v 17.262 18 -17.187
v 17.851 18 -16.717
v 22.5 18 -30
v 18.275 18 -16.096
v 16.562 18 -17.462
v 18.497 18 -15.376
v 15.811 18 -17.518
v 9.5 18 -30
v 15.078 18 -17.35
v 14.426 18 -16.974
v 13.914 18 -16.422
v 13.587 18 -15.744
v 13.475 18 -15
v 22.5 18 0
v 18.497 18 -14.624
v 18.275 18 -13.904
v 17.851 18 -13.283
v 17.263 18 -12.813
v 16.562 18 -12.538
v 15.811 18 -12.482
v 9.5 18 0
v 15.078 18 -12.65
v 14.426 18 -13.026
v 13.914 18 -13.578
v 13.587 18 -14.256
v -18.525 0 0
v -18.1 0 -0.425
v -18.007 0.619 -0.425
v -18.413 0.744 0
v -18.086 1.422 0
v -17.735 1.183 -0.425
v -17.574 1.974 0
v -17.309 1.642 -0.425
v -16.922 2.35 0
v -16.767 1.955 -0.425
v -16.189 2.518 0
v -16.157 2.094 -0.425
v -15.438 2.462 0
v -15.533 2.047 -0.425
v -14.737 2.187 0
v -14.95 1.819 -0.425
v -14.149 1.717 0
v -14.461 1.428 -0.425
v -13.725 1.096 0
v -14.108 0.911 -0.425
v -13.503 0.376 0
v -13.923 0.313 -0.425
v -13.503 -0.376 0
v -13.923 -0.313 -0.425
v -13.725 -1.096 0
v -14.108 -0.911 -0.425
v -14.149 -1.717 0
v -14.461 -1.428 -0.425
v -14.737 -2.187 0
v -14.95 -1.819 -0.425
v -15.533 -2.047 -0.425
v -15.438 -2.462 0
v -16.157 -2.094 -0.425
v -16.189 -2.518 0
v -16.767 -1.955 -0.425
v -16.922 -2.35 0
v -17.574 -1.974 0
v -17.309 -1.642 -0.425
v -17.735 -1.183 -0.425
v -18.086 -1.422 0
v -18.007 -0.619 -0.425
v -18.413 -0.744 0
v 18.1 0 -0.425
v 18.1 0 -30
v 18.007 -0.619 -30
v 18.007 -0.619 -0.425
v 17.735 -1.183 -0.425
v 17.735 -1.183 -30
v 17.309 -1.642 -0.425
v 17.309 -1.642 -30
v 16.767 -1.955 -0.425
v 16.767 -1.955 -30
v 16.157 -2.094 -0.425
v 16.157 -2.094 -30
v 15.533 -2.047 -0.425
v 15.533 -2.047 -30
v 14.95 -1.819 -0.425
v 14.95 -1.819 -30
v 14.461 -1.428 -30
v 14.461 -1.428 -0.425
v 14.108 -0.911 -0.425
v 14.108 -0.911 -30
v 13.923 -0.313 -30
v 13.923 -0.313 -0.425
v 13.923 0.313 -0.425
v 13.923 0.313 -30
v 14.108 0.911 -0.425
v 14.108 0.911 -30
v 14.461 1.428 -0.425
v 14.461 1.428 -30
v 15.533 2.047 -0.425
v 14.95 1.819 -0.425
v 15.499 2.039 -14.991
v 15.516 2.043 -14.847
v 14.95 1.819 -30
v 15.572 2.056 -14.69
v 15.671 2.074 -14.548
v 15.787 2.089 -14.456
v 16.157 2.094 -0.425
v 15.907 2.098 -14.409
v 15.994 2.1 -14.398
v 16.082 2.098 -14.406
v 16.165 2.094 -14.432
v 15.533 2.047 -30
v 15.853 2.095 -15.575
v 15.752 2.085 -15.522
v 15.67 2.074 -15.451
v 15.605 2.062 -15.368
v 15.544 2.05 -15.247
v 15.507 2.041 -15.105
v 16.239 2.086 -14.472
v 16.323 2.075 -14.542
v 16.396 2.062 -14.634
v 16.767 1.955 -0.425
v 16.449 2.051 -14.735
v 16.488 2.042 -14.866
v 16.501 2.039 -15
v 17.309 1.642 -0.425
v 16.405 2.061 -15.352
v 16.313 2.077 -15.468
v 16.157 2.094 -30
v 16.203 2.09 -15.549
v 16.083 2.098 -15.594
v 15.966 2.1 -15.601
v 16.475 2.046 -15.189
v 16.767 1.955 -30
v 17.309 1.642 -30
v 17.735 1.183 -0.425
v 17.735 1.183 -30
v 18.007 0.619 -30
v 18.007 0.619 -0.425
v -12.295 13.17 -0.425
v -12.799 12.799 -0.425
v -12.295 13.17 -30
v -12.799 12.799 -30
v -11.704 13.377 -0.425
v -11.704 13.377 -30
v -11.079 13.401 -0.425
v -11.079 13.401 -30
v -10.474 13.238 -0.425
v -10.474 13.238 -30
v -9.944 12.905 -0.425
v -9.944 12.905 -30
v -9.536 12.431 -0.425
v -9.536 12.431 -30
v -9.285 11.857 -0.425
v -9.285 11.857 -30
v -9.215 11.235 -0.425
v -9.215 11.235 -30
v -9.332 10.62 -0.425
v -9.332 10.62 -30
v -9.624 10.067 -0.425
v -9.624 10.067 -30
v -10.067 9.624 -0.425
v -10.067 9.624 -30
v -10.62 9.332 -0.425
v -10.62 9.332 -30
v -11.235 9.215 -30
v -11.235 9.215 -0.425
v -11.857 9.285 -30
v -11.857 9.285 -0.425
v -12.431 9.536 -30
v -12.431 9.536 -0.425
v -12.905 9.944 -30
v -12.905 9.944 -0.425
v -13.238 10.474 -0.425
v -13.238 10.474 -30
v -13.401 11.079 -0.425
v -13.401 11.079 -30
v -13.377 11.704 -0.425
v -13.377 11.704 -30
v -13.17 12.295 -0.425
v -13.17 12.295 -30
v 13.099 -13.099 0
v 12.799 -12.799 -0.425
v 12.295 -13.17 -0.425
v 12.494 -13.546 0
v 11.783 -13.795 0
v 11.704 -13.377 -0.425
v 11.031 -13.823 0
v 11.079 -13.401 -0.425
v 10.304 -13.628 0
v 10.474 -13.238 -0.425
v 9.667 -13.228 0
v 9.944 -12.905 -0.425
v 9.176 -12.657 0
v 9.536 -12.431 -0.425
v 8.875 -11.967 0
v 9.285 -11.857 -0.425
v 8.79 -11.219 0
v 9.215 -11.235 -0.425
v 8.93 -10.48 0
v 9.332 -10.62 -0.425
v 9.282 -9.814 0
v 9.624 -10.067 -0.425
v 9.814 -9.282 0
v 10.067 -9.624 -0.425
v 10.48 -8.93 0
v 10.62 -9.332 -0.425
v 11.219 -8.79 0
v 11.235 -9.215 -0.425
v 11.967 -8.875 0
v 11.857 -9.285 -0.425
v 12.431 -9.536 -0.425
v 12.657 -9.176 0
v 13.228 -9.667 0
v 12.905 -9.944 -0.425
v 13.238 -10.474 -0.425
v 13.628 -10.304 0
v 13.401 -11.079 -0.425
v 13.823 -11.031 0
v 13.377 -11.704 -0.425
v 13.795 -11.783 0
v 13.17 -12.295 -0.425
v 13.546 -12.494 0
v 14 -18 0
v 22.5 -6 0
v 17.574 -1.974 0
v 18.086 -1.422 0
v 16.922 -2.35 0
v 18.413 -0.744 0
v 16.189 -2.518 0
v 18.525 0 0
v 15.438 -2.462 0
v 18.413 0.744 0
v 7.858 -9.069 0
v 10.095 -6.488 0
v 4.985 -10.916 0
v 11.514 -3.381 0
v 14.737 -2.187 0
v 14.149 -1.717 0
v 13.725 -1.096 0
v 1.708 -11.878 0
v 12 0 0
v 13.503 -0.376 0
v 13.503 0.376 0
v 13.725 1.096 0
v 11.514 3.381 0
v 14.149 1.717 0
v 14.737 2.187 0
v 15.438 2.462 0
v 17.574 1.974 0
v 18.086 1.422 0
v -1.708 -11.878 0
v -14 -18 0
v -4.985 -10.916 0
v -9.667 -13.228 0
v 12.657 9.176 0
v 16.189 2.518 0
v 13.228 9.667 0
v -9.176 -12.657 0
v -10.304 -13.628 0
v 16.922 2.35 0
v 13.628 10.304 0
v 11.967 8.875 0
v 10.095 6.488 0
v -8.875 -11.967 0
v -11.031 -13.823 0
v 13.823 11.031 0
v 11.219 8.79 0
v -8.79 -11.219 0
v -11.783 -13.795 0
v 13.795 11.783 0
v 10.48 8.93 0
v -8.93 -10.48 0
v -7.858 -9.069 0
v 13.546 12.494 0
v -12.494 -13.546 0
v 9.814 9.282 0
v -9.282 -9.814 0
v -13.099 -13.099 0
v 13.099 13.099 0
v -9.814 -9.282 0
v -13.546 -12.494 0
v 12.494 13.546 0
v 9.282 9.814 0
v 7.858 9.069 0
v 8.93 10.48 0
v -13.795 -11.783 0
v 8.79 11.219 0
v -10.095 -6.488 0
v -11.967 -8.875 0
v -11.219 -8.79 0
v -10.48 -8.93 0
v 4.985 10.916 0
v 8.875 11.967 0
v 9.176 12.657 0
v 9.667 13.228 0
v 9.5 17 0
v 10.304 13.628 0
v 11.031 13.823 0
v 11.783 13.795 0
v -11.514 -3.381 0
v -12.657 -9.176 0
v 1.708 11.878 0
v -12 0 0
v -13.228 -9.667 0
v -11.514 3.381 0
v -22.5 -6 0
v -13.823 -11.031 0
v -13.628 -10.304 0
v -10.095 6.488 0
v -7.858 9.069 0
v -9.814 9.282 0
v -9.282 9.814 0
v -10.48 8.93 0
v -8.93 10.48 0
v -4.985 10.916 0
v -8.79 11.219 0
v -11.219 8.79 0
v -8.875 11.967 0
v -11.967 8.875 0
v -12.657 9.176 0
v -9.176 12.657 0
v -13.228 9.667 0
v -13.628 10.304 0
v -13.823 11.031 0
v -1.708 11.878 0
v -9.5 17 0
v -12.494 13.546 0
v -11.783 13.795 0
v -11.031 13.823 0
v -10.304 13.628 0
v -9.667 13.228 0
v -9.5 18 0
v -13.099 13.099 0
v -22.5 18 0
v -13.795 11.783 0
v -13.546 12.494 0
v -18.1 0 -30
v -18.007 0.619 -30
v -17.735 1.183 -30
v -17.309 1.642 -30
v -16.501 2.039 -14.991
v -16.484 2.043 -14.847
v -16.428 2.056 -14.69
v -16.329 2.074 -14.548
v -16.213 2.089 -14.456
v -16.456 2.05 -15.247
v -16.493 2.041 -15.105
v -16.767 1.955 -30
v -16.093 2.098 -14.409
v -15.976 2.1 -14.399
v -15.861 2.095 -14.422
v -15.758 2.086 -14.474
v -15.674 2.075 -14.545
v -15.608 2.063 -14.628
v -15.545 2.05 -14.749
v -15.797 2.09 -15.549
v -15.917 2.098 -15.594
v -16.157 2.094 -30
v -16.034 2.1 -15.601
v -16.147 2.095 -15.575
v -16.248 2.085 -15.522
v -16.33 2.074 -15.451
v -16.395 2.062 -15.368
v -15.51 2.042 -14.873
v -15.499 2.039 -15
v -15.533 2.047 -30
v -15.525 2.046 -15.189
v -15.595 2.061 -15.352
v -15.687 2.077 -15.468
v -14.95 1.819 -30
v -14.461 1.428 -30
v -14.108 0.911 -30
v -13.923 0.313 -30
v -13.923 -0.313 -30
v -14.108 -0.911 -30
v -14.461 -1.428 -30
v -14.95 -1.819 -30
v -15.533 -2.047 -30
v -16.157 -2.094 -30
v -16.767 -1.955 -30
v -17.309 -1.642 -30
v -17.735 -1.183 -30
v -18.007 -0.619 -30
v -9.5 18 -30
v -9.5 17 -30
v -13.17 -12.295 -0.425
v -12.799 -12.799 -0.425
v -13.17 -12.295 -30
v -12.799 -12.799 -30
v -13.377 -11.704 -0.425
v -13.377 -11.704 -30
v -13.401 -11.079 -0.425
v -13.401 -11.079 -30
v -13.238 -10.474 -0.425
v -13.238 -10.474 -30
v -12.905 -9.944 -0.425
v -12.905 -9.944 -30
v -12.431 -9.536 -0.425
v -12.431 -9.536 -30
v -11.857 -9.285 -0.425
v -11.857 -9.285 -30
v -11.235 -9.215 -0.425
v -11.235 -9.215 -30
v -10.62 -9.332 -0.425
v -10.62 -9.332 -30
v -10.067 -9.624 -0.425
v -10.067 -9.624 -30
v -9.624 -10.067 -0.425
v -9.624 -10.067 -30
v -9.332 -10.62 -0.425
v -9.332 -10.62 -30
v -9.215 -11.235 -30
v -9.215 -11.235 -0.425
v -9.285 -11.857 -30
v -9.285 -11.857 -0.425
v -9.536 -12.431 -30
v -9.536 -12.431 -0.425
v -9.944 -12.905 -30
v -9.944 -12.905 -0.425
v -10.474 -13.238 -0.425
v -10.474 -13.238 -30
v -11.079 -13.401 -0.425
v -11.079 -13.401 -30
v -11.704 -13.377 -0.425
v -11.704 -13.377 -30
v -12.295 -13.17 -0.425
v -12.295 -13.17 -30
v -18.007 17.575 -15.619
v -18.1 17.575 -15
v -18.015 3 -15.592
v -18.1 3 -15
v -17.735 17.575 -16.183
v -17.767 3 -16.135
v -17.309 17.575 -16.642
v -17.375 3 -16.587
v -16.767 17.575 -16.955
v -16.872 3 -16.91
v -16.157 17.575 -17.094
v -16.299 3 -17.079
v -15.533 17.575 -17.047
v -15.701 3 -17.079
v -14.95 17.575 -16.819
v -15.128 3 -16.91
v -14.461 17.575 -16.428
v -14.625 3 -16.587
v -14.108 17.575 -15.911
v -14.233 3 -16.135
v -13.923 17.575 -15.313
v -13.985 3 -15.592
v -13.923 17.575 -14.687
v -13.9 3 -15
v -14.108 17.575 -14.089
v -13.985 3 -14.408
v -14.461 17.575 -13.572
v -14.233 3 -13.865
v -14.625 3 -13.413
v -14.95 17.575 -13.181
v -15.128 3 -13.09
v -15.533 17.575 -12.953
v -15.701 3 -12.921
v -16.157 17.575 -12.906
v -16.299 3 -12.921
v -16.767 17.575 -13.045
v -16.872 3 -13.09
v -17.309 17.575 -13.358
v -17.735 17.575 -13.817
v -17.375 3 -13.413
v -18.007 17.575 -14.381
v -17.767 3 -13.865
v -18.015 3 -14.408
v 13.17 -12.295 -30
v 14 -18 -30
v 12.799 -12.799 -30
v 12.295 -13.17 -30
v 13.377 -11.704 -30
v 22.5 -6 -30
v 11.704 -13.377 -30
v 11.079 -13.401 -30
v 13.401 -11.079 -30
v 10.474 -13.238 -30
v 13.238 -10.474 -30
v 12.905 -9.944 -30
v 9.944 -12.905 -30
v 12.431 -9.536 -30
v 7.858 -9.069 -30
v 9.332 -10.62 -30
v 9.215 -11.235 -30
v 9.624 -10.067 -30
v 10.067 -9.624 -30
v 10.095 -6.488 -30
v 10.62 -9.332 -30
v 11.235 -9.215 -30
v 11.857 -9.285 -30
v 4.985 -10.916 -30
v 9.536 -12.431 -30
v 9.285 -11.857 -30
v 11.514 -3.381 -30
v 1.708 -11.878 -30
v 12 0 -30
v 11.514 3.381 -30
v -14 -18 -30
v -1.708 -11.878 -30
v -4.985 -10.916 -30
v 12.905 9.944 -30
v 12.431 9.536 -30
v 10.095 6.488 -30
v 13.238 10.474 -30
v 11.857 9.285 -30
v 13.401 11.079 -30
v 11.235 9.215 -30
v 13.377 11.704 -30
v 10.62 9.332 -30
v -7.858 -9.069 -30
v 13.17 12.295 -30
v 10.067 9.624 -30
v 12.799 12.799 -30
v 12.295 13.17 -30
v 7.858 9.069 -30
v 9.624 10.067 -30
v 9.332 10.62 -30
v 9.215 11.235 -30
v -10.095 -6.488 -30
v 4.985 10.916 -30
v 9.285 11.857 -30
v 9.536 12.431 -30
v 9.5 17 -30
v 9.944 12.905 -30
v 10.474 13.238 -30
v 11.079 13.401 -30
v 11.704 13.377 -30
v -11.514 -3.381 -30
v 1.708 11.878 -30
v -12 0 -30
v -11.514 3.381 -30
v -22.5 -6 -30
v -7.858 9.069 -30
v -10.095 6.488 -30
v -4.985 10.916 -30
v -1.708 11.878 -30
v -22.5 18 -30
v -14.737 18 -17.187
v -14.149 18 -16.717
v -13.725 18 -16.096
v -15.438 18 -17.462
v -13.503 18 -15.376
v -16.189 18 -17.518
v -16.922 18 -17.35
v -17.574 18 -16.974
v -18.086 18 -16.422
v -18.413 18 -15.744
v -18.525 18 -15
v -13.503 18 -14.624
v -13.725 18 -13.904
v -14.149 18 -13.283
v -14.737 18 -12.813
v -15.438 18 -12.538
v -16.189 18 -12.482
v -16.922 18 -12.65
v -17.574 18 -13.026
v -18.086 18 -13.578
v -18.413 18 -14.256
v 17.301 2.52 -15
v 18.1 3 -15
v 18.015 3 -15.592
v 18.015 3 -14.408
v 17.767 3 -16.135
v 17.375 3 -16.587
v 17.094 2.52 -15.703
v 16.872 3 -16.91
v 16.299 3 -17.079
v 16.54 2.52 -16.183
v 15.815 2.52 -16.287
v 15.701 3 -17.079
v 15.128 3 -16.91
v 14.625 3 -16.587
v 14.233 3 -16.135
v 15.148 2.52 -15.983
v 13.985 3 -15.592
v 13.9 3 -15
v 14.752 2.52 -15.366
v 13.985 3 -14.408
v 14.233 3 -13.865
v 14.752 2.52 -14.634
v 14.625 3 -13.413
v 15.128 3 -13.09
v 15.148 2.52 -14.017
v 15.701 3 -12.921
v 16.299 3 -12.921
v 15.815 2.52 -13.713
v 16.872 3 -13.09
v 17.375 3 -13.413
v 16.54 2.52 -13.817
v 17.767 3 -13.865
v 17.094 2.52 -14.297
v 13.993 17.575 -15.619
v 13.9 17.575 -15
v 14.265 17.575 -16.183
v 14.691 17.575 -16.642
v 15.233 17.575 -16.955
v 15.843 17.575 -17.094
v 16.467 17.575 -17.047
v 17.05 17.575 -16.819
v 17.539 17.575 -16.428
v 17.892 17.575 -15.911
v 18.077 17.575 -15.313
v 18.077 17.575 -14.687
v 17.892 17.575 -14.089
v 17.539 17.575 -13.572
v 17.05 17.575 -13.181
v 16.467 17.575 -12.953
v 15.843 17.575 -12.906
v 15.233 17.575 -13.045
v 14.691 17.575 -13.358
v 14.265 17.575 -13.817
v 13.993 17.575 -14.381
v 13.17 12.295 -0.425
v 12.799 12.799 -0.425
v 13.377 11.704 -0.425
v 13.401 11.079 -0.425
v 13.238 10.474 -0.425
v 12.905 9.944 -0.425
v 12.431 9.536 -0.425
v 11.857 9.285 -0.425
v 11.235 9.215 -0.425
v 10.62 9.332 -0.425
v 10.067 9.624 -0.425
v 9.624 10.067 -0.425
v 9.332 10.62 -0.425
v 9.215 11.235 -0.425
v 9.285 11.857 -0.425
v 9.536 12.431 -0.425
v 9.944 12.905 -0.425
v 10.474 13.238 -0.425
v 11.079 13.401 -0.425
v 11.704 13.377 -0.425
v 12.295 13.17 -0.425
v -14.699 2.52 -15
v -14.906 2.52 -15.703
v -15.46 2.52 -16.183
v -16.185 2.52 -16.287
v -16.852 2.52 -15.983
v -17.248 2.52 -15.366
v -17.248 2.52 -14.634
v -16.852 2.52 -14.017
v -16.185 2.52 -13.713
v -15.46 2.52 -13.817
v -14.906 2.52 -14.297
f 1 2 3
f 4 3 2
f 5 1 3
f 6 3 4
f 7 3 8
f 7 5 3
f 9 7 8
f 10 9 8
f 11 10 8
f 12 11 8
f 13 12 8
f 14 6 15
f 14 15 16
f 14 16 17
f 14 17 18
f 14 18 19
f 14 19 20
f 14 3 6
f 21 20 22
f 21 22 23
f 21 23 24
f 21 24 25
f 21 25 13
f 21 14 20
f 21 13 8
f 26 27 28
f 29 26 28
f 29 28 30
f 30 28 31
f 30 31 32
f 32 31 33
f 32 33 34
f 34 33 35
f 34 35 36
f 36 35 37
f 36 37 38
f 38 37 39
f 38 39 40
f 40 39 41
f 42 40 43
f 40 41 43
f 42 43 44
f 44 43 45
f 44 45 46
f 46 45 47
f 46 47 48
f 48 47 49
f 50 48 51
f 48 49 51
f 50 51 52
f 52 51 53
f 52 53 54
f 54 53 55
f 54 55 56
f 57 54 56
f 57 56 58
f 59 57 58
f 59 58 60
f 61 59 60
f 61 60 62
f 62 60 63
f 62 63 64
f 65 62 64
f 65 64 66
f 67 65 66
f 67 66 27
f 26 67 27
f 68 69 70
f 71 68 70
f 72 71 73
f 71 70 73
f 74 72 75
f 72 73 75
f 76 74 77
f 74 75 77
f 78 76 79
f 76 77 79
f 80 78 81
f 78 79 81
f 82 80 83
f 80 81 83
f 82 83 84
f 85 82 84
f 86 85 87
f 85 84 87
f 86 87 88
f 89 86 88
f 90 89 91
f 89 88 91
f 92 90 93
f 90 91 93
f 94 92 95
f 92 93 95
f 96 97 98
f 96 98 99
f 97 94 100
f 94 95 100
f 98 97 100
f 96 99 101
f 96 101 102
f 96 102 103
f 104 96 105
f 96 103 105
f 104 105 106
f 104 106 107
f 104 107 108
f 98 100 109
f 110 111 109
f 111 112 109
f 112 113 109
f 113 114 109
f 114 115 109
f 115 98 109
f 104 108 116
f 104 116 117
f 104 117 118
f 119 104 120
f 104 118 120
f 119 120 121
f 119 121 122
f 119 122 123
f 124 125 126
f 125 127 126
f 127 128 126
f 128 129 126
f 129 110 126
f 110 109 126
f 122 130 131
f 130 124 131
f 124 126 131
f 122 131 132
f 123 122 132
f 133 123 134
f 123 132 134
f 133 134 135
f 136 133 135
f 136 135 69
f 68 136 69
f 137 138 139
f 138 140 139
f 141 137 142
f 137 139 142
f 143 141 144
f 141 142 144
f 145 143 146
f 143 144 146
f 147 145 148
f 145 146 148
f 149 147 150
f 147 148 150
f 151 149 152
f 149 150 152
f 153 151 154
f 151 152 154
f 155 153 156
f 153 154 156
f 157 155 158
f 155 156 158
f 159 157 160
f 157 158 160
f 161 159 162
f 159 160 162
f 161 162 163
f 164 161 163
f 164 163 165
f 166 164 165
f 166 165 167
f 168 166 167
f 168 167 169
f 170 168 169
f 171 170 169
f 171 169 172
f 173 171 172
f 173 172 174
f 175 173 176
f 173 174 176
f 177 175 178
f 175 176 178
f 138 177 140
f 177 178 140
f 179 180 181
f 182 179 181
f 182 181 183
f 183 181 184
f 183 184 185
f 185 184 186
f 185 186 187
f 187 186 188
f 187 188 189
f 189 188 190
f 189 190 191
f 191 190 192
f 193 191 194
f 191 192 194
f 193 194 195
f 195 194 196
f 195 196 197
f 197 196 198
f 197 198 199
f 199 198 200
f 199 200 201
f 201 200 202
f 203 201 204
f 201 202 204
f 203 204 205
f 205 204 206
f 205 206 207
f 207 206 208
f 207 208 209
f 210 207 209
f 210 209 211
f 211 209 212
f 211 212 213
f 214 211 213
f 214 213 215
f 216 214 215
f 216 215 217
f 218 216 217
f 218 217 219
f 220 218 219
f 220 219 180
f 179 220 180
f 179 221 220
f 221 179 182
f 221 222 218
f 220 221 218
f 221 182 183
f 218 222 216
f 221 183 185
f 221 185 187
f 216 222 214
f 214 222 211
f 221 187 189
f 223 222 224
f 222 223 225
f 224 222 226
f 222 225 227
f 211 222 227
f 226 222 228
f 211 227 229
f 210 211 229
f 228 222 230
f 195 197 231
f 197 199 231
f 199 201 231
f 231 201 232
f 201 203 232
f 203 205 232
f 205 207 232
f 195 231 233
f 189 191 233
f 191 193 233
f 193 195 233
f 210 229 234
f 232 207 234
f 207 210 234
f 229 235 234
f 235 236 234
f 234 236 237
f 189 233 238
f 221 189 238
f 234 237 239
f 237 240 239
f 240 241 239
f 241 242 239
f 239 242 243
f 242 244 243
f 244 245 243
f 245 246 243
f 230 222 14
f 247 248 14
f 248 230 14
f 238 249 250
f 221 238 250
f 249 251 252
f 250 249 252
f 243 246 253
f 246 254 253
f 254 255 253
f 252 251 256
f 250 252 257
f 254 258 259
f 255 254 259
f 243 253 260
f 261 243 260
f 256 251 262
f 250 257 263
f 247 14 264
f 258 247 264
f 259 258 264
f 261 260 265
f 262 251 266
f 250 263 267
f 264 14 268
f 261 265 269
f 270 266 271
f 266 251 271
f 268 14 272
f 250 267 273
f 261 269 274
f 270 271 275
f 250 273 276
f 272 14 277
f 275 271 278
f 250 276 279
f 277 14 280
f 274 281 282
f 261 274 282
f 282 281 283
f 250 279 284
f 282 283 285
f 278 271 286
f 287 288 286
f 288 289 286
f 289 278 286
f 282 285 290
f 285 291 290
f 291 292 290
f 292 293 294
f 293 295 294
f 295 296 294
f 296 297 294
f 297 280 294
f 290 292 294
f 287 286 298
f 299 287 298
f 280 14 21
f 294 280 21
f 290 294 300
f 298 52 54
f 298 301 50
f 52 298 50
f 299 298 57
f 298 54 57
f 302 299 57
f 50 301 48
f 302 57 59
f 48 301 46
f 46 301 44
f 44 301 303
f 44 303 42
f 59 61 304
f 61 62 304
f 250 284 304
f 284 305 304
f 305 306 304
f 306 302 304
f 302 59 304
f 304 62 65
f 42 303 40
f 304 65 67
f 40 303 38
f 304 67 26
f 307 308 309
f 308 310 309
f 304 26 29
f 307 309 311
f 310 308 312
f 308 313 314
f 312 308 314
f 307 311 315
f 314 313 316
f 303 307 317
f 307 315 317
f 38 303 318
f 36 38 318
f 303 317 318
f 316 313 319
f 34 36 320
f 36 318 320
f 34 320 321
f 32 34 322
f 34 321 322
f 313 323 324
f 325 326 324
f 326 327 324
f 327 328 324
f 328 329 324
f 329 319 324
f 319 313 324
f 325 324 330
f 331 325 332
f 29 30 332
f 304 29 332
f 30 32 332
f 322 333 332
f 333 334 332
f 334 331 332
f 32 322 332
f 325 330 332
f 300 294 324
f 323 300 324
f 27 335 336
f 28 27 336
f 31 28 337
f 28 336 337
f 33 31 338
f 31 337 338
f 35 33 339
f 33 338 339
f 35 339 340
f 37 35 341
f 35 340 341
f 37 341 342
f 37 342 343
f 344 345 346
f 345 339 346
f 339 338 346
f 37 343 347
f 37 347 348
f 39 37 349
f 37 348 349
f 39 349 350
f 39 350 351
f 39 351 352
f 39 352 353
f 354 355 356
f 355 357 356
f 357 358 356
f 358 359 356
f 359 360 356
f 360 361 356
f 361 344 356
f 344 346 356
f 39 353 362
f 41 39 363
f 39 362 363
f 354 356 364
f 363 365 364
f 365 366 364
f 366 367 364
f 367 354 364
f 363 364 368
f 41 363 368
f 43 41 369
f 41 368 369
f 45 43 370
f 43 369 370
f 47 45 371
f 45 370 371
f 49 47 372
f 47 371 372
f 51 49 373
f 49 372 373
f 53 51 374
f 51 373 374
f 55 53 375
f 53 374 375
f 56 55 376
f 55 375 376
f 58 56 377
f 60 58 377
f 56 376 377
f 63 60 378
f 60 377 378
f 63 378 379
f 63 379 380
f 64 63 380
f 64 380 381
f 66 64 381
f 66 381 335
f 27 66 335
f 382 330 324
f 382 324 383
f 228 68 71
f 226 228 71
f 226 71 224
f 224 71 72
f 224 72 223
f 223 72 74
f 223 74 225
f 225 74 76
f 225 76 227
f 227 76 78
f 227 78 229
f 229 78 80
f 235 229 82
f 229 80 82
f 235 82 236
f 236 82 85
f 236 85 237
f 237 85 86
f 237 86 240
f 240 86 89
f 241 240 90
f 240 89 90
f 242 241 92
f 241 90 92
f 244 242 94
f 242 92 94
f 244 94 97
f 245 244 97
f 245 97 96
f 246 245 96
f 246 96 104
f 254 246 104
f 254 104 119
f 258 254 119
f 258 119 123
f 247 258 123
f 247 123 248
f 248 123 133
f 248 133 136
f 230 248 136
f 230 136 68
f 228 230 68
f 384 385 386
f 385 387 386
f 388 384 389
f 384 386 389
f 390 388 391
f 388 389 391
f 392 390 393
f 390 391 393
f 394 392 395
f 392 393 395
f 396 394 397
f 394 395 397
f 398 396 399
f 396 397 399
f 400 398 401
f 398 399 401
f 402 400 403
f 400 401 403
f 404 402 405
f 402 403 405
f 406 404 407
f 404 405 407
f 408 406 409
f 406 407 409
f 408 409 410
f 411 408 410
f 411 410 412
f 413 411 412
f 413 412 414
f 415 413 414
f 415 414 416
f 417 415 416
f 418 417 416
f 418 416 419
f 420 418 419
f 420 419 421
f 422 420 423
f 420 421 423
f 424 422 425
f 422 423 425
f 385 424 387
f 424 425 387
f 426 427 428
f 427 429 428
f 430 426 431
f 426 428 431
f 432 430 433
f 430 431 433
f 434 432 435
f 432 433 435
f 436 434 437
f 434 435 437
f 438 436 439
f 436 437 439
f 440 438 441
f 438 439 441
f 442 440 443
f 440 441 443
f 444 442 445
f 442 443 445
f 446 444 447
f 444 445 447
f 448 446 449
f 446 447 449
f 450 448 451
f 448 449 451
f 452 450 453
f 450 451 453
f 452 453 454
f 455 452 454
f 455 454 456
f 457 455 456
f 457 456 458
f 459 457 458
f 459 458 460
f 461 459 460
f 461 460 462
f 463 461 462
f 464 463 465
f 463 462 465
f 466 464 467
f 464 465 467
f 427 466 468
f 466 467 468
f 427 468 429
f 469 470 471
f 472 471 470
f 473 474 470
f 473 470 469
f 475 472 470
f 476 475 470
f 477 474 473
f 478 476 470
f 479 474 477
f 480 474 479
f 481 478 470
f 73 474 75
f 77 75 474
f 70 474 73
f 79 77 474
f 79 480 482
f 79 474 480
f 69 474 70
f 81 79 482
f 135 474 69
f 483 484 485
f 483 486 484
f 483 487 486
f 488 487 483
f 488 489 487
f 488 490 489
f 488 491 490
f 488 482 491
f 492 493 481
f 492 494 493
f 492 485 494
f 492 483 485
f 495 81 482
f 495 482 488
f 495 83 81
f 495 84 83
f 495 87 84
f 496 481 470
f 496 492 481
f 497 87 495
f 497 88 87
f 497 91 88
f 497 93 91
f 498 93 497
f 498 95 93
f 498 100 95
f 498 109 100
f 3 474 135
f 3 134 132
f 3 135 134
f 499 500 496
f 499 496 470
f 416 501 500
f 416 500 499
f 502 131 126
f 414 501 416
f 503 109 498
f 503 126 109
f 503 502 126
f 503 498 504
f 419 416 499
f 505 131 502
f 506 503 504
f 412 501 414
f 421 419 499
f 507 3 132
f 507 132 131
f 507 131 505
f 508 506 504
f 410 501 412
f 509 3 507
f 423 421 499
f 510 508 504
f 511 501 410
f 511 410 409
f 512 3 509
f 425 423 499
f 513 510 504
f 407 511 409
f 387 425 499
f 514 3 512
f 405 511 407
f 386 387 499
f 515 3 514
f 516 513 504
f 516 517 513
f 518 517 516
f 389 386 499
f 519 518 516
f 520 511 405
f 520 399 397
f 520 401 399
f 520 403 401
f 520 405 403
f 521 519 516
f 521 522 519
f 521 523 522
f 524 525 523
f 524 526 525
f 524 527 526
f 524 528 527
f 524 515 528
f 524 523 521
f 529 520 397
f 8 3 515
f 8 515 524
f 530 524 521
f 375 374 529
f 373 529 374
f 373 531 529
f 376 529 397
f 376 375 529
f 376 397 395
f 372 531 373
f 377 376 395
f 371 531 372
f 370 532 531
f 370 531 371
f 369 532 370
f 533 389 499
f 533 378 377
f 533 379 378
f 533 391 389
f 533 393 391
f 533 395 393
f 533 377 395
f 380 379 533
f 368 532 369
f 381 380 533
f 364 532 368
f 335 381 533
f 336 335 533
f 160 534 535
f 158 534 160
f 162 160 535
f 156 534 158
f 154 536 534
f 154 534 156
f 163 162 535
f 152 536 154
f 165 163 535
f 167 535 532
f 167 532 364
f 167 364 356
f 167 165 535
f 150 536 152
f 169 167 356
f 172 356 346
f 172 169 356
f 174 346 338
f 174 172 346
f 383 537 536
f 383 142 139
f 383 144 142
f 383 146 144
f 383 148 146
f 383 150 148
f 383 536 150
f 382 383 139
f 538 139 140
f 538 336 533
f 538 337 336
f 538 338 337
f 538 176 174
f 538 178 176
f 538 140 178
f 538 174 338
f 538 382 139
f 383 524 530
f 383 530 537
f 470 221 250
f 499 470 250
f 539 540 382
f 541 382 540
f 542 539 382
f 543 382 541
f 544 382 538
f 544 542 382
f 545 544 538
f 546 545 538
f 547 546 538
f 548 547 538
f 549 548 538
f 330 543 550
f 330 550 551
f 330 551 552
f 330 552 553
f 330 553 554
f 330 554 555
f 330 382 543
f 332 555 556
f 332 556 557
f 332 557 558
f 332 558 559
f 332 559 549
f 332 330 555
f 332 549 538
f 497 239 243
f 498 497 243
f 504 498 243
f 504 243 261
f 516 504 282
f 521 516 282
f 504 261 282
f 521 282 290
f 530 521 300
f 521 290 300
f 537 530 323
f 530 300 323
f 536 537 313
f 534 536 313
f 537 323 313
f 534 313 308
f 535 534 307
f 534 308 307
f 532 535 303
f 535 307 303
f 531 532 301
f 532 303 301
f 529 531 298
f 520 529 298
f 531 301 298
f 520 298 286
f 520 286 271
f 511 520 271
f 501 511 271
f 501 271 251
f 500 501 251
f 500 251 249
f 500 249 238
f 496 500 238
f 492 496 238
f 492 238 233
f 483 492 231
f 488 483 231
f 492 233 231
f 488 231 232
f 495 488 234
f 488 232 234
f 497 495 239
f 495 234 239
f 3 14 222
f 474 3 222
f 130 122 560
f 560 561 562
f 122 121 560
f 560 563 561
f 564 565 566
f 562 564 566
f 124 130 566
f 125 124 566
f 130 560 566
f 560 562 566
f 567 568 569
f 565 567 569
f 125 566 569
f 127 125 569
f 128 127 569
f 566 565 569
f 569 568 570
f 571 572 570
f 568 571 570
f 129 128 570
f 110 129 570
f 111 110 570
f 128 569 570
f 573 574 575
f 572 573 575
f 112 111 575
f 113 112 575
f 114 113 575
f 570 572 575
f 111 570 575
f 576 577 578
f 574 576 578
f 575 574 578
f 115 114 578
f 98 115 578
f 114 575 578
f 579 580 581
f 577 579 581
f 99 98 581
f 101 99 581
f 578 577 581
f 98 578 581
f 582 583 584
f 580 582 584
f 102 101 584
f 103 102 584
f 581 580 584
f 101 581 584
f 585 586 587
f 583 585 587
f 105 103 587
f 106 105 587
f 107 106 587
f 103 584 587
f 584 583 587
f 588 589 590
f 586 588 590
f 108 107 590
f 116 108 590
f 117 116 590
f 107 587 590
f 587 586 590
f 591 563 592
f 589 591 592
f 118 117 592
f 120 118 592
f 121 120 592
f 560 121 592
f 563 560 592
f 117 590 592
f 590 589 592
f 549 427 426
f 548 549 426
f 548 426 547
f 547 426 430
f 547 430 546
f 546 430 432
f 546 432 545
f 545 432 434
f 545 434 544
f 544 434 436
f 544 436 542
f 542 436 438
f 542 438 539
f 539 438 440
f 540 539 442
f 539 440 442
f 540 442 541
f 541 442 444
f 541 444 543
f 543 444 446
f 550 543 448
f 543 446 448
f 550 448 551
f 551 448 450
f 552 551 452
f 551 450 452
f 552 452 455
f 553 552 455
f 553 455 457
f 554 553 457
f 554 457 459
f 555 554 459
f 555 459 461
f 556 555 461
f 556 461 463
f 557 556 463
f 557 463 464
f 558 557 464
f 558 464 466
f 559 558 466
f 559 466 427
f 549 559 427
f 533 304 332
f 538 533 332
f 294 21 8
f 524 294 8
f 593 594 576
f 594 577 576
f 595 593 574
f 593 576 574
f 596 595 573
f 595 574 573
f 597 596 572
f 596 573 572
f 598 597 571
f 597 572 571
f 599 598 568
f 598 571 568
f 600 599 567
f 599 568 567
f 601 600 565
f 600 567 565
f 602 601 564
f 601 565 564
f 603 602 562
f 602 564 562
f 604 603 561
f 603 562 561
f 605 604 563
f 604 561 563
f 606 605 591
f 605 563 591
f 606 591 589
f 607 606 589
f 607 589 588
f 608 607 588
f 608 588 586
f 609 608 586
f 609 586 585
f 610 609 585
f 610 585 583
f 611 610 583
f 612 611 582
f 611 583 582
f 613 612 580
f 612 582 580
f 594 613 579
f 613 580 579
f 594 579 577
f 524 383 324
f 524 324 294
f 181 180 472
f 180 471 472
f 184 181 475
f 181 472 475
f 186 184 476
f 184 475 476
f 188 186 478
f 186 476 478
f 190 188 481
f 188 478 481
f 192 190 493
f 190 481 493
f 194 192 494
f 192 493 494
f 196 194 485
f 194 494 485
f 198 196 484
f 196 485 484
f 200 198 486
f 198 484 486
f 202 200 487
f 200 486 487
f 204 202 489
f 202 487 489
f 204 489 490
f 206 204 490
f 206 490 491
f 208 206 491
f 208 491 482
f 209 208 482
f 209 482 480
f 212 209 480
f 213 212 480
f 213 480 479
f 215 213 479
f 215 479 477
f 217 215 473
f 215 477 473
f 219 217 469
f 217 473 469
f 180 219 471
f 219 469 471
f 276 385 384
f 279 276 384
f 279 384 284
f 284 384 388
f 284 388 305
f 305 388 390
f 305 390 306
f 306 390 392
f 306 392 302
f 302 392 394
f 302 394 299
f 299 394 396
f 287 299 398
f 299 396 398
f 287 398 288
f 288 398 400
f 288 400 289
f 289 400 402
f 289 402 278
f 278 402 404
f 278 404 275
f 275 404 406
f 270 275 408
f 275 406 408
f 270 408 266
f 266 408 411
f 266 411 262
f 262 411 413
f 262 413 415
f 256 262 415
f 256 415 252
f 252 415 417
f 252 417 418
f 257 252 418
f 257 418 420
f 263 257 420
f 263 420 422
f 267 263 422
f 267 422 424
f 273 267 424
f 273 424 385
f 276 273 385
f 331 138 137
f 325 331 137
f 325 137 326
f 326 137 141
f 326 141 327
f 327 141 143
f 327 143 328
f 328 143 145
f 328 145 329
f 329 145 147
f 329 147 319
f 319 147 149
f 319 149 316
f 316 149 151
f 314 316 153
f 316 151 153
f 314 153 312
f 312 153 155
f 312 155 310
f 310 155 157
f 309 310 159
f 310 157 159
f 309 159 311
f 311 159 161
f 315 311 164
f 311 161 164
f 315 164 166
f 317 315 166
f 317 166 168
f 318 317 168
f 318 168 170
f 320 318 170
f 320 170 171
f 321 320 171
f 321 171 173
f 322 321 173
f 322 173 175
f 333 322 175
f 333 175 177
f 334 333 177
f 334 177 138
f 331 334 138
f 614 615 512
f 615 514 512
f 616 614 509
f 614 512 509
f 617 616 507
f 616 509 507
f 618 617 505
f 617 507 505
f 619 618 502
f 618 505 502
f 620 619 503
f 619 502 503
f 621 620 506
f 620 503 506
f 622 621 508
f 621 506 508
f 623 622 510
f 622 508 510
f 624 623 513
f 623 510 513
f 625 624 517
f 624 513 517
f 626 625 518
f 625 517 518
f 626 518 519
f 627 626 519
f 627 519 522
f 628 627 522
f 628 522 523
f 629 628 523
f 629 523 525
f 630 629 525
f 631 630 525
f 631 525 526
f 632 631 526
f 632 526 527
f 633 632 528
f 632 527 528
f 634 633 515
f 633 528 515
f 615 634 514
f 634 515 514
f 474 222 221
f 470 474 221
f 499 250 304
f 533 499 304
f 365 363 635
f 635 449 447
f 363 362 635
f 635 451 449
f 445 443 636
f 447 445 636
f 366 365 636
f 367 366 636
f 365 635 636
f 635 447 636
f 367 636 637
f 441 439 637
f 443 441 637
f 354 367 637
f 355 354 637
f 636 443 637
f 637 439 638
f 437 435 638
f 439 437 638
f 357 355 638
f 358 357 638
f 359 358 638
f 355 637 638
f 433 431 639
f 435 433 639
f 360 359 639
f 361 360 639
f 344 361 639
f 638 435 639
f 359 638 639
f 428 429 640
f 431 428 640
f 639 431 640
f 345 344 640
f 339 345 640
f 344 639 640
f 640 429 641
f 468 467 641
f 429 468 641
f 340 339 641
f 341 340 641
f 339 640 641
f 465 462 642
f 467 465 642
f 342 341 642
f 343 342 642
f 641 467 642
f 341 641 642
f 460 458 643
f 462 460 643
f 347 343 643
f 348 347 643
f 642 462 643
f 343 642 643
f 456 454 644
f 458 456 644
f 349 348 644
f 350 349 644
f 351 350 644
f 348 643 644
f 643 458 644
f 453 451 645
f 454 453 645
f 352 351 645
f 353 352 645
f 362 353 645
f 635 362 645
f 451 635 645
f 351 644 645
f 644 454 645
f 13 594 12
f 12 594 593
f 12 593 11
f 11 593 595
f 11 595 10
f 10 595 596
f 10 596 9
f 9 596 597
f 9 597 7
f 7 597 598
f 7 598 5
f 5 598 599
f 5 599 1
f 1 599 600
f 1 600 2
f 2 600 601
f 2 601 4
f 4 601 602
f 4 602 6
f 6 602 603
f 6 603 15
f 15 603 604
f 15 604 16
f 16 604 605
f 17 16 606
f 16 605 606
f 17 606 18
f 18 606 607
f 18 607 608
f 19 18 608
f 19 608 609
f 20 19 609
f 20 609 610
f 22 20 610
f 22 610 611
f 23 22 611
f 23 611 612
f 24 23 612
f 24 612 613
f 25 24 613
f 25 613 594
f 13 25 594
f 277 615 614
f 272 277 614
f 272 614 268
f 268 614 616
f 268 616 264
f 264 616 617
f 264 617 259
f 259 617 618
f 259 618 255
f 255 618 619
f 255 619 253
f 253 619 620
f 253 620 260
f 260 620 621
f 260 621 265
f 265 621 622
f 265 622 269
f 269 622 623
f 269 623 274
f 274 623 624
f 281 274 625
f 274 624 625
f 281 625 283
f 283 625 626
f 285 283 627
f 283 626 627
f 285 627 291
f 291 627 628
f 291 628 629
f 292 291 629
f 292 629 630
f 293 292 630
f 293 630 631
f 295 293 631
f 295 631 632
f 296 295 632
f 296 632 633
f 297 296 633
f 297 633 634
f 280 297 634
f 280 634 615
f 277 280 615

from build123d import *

# Parameters (mm, degrees)
SKETCH_1_R                   = 12
EXTRUDE_894_DEPTH            = 30
HOLE_WIZARD_5_D              = 4.2
HOLE_WIZARD_5_CSINK_D        = 5.05
HOLE_WIZARD_5_CSINK_ANGLE    = 90
PATTERN_CIRCULAR_1906_COUNT  = 8
SKETCH_27_W                  = 19
SKETCH_27_H                  = 30
CUT_EXTRUDE_2273_DEPTH       = 1
HOLE_WIZARD_2331_D           = 4.2
HOLE_WIZARD_2331_DEPTH       = 15
HOLE_WIZARD_2331_CSINK_D     = 5.05
HOLE_WIZARD_2331_CSINK_ANGLE = 90
HOLE_WIZARD_2331_TIP         = 1.2618073


with BuildPart() as part:
    # Эскиз1 → Extrude 894 (new body)
    with BuildSketch(Plane.XY):
        Polygon((-22.5, 18), (0, 18), (22.5, 18), (22.5, -6), (14, -18), (-14, -18), (-22.5, -6), align=None)
        Circle(SKETCH_1_R, mode=Mode.SUBTRACT)
    extrude(amount=-EXTRUDE_894_DEPTH)

    # Гайка М5 (through all)
    with Locations(Plane.XY):
        with Locations((-16, 0)):
            hole_wizard_5 = CounterSinkHole(HOLE_WIZARD_5_D / 2, HOLE_WIZARD_5_CSINK_D / 2, counter_sink_angle=HOLE_WIZARD_5_CSINK_ANGLE)

    # Pattern Circular 1906: Гайка М5 ×8 about axis, 2 skipped
    pattern_circular_1906_axis = Axis((0, 0, 0), (0, 0, 1))
    add([hole_wizard_5.rotate(pattern_circular_1906_axis, i * 360 / PATTERN_CIRCULAR_1906_COUNT) for i in range(1, PATTERN_CIRCULAR_1906_COUNT) if i not in (2, 6)], mode=Mode.SUBTRACT)

    # Эскиз27 → Cut-Extrude 2273 (cut)
    with BuildSketch(Plane(origin=(0, 18, 0), x_dir=(1, 0, 0), z_dir=(0, 1, 0))):
        with Locations((0, 15)):
            Rectangle(SKETCH_27_W, SKETCH_27_H)
    extrude(amount=-CUT_EXTRUDE_2273_DEPTH, mode=Mode.SUBTRACT)

    # Hole Wizard 2331
    with Locations(Plane(origin=(0, 18, 0), x_dir=(1, 0, 0), z_dir=(0, 1, 0))):
        with Locations((16, 15), (-16, 15)):
            CounterSinkHole(HOLE_WIZARD_2331_D / 2, HOLE_WIZARD_2331_CSINK_D / 2, depth=HOLE_WIZARD_2331_DEPTH, counter_sink_angle=HOLE_WIZARD_2331_CSINK_ANGLE)
            with Locations((0, 0, -(HOLE_WIZARD_2331_DEPTH + HOLE_WIZARD_2331_TIP / 2))):  # 118° drill point
                Cone(0, HOLE_WIZARD_2331_D / 2, HOLE_WIZARD_2331_TIP, mode=Mode.SUBTRACT)


solid = part.part
